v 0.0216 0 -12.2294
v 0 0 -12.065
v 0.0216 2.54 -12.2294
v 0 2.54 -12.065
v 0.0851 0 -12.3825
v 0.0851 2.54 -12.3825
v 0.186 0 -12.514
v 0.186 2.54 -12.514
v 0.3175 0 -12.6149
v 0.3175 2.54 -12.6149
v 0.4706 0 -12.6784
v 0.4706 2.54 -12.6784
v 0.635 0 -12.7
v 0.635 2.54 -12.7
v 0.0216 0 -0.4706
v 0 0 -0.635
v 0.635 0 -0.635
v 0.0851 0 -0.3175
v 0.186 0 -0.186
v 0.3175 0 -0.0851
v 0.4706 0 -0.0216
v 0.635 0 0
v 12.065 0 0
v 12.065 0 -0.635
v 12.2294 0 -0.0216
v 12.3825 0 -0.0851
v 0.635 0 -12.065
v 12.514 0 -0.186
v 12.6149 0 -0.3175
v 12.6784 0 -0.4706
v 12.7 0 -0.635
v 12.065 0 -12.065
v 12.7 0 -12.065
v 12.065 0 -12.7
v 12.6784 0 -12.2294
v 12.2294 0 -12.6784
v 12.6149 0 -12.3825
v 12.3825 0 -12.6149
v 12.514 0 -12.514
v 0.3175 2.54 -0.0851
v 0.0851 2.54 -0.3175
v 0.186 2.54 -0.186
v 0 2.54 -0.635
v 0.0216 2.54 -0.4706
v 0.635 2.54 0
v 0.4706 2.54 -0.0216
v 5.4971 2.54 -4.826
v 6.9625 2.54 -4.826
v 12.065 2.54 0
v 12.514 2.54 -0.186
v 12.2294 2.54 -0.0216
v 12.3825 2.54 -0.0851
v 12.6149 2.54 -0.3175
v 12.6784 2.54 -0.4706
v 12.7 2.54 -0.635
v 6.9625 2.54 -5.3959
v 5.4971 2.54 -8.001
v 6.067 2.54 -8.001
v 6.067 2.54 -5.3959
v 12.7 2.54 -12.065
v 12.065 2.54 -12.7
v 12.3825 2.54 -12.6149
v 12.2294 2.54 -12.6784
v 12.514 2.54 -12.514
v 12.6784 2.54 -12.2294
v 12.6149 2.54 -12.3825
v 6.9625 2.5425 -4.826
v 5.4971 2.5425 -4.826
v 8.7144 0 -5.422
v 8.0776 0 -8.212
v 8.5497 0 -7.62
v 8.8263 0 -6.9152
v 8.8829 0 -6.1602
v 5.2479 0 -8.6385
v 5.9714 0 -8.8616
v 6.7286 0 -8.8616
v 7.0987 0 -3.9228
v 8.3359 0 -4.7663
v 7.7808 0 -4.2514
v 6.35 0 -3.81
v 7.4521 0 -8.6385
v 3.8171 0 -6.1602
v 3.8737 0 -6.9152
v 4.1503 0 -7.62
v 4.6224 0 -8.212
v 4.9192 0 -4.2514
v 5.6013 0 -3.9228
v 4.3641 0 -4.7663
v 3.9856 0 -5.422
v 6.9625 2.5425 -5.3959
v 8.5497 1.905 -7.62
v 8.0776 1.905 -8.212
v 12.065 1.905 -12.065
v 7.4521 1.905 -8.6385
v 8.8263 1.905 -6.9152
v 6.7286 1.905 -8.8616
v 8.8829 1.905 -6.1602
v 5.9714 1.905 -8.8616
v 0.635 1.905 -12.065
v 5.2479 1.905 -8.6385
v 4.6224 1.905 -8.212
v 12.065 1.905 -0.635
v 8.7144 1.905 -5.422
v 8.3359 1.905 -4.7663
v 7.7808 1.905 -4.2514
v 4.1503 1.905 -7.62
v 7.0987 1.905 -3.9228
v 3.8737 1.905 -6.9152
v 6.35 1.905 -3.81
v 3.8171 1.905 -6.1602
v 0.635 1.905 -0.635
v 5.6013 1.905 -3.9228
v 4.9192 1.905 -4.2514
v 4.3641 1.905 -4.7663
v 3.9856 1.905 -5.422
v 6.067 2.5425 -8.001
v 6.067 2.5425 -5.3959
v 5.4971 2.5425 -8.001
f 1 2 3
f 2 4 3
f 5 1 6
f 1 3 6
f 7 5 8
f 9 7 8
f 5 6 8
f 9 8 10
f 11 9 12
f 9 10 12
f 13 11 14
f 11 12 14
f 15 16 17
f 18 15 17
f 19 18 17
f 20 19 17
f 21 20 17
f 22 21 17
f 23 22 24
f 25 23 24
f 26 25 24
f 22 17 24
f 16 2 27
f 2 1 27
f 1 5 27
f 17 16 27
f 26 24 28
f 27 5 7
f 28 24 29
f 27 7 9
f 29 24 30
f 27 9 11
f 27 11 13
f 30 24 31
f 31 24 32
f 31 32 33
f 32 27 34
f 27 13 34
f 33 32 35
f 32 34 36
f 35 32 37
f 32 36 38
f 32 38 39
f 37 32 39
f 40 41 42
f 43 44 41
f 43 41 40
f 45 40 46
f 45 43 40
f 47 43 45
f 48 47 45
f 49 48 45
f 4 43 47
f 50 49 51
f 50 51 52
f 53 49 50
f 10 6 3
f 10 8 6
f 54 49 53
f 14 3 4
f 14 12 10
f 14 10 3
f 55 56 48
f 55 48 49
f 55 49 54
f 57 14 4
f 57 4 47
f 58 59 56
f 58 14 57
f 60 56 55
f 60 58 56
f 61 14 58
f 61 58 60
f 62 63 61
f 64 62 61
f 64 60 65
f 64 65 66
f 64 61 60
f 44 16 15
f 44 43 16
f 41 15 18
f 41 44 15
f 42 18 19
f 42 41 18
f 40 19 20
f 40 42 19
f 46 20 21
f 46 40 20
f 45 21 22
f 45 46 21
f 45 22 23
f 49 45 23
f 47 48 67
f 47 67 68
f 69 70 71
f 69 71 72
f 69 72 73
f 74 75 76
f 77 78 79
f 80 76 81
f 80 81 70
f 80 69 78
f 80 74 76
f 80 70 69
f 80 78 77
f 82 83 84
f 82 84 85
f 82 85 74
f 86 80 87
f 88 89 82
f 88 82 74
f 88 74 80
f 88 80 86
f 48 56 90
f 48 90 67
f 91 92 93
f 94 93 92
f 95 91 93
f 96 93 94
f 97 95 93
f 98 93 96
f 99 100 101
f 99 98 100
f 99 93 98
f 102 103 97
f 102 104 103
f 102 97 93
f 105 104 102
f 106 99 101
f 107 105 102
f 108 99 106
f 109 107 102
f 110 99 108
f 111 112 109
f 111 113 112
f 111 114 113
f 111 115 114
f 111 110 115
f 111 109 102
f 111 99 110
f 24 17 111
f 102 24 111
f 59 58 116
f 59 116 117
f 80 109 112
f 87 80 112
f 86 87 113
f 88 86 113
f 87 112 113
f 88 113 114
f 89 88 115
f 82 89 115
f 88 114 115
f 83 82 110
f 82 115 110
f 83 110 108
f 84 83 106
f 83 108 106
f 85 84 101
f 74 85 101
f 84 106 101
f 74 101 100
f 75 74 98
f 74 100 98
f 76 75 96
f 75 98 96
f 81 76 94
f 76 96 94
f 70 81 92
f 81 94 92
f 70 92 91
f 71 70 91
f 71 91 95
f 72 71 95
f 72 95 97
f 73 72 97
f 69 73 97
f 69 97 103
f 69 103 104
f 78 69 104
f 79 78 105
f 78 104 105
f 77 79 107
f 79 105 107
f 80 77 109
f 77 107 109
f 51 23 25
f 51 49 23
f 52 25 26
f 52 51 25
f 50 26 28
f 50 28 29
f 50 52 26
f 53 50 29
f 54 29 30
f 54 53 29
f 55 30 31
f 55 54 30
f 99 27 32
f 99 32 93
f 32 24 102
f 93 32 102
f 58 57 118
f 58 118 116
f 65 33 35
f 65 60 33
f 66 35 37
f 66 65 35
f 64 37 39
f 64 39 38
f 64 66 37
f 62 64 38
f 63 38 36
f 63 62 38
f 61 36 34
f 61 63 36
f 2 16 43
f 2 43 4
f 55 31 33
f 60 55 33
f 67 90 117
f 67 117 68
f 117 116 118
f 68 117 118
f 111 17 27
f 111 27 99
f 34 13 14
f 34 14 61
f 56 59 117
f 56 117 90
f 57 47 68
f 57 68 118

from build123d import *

# Parameters (mm, degrees)
SKETCH1_W           = 12.7
SKETCH1_H           = 12.7
BOSS_EXTRUDE1_DEPTH = 2.54
FILLET1_R           = 0.635
SHELL1_START        = 0.635
SHELL1_OUTLINE_W    = 1.905
SHELL1_OUTLINE_H    = 11.43
SHELL1_DEPTH        = 11.43
SKETCH2_R           = 2.54
BOSS_EXTRUDE2_DEPTH = 1.905
BOSS_EXTRUDE3_DEPTH = 0.00254


# Read off the part's stored shape, not the designer's step: Shell1
with BuildPart() as part:
    # Sketch1 → Boss-Extrude1 (new body)
    with BuildSketch(Plane(origin=(0, 0, 0), x_dir=(1, 0, 0), z_dir=(0, 1, 0))):
        with Locations((6.35, 6.35)):
            Rectangle(SKETCH1_W, SKETCH1_H)
    extrude(amount=BOSS_EXTRUDE1_DEPTH)

    # Fillet1
    fillet1_edges = [part.edges().sort_by_distance(p)[0] for p in [
        (0, 1.27, -12.7),
        (12.7, 1.27, -12.7),
        (12.7, 1.27, 0),
        (0, 1.27, 0),
    ]]
    fillet(fillet1_edges, radius=FILLET1_R)

    # Shell1 outline → Shell1 (cut)
    with BuildSketch(Plane.YZ.offset(SHELL1_START)):
        with Locations((0.9525, -6.35)):
            Rectangle(SHELL1_OUTLINE_W, SHELL1_OUTLINE_H)
    extrude(amount=SHELL1_DEPTH, mode=Mode.SUBTRACT)

    # Sketch2 → Boss-Extrude2 (add)
    with BuildSketch(Plane(origin=(0, 1.905, 0), x_dir=(-1, 0, 0), z_dir=(0, -1, 0))):
        with Locations(Location((-6.35, 6.35, 0), (0, 0, 270))):
            Circle(SKETCH2_R)
    extrude(amount=BOSS_EXTRUDE2_DEPTH)

    # Sketch3 → Boss-Extrude3 (add)
    with BuildSketch(Plane(origin=(0, 2.54, 0), x_dir=(1, 0, 0), z_dir=(0, 1, 0))):
        Polygon((5.497146154, 8.001), (6.067017949, 8.001), (6.067017949, 5.395871795), (6.962530769, 5.395871795), (6.962530769, 4.826), (5.497146154, 4.826), align=None)
    extrude(amount=BOSS_EXTRUDE3_DEPTH)


solid = part.part
